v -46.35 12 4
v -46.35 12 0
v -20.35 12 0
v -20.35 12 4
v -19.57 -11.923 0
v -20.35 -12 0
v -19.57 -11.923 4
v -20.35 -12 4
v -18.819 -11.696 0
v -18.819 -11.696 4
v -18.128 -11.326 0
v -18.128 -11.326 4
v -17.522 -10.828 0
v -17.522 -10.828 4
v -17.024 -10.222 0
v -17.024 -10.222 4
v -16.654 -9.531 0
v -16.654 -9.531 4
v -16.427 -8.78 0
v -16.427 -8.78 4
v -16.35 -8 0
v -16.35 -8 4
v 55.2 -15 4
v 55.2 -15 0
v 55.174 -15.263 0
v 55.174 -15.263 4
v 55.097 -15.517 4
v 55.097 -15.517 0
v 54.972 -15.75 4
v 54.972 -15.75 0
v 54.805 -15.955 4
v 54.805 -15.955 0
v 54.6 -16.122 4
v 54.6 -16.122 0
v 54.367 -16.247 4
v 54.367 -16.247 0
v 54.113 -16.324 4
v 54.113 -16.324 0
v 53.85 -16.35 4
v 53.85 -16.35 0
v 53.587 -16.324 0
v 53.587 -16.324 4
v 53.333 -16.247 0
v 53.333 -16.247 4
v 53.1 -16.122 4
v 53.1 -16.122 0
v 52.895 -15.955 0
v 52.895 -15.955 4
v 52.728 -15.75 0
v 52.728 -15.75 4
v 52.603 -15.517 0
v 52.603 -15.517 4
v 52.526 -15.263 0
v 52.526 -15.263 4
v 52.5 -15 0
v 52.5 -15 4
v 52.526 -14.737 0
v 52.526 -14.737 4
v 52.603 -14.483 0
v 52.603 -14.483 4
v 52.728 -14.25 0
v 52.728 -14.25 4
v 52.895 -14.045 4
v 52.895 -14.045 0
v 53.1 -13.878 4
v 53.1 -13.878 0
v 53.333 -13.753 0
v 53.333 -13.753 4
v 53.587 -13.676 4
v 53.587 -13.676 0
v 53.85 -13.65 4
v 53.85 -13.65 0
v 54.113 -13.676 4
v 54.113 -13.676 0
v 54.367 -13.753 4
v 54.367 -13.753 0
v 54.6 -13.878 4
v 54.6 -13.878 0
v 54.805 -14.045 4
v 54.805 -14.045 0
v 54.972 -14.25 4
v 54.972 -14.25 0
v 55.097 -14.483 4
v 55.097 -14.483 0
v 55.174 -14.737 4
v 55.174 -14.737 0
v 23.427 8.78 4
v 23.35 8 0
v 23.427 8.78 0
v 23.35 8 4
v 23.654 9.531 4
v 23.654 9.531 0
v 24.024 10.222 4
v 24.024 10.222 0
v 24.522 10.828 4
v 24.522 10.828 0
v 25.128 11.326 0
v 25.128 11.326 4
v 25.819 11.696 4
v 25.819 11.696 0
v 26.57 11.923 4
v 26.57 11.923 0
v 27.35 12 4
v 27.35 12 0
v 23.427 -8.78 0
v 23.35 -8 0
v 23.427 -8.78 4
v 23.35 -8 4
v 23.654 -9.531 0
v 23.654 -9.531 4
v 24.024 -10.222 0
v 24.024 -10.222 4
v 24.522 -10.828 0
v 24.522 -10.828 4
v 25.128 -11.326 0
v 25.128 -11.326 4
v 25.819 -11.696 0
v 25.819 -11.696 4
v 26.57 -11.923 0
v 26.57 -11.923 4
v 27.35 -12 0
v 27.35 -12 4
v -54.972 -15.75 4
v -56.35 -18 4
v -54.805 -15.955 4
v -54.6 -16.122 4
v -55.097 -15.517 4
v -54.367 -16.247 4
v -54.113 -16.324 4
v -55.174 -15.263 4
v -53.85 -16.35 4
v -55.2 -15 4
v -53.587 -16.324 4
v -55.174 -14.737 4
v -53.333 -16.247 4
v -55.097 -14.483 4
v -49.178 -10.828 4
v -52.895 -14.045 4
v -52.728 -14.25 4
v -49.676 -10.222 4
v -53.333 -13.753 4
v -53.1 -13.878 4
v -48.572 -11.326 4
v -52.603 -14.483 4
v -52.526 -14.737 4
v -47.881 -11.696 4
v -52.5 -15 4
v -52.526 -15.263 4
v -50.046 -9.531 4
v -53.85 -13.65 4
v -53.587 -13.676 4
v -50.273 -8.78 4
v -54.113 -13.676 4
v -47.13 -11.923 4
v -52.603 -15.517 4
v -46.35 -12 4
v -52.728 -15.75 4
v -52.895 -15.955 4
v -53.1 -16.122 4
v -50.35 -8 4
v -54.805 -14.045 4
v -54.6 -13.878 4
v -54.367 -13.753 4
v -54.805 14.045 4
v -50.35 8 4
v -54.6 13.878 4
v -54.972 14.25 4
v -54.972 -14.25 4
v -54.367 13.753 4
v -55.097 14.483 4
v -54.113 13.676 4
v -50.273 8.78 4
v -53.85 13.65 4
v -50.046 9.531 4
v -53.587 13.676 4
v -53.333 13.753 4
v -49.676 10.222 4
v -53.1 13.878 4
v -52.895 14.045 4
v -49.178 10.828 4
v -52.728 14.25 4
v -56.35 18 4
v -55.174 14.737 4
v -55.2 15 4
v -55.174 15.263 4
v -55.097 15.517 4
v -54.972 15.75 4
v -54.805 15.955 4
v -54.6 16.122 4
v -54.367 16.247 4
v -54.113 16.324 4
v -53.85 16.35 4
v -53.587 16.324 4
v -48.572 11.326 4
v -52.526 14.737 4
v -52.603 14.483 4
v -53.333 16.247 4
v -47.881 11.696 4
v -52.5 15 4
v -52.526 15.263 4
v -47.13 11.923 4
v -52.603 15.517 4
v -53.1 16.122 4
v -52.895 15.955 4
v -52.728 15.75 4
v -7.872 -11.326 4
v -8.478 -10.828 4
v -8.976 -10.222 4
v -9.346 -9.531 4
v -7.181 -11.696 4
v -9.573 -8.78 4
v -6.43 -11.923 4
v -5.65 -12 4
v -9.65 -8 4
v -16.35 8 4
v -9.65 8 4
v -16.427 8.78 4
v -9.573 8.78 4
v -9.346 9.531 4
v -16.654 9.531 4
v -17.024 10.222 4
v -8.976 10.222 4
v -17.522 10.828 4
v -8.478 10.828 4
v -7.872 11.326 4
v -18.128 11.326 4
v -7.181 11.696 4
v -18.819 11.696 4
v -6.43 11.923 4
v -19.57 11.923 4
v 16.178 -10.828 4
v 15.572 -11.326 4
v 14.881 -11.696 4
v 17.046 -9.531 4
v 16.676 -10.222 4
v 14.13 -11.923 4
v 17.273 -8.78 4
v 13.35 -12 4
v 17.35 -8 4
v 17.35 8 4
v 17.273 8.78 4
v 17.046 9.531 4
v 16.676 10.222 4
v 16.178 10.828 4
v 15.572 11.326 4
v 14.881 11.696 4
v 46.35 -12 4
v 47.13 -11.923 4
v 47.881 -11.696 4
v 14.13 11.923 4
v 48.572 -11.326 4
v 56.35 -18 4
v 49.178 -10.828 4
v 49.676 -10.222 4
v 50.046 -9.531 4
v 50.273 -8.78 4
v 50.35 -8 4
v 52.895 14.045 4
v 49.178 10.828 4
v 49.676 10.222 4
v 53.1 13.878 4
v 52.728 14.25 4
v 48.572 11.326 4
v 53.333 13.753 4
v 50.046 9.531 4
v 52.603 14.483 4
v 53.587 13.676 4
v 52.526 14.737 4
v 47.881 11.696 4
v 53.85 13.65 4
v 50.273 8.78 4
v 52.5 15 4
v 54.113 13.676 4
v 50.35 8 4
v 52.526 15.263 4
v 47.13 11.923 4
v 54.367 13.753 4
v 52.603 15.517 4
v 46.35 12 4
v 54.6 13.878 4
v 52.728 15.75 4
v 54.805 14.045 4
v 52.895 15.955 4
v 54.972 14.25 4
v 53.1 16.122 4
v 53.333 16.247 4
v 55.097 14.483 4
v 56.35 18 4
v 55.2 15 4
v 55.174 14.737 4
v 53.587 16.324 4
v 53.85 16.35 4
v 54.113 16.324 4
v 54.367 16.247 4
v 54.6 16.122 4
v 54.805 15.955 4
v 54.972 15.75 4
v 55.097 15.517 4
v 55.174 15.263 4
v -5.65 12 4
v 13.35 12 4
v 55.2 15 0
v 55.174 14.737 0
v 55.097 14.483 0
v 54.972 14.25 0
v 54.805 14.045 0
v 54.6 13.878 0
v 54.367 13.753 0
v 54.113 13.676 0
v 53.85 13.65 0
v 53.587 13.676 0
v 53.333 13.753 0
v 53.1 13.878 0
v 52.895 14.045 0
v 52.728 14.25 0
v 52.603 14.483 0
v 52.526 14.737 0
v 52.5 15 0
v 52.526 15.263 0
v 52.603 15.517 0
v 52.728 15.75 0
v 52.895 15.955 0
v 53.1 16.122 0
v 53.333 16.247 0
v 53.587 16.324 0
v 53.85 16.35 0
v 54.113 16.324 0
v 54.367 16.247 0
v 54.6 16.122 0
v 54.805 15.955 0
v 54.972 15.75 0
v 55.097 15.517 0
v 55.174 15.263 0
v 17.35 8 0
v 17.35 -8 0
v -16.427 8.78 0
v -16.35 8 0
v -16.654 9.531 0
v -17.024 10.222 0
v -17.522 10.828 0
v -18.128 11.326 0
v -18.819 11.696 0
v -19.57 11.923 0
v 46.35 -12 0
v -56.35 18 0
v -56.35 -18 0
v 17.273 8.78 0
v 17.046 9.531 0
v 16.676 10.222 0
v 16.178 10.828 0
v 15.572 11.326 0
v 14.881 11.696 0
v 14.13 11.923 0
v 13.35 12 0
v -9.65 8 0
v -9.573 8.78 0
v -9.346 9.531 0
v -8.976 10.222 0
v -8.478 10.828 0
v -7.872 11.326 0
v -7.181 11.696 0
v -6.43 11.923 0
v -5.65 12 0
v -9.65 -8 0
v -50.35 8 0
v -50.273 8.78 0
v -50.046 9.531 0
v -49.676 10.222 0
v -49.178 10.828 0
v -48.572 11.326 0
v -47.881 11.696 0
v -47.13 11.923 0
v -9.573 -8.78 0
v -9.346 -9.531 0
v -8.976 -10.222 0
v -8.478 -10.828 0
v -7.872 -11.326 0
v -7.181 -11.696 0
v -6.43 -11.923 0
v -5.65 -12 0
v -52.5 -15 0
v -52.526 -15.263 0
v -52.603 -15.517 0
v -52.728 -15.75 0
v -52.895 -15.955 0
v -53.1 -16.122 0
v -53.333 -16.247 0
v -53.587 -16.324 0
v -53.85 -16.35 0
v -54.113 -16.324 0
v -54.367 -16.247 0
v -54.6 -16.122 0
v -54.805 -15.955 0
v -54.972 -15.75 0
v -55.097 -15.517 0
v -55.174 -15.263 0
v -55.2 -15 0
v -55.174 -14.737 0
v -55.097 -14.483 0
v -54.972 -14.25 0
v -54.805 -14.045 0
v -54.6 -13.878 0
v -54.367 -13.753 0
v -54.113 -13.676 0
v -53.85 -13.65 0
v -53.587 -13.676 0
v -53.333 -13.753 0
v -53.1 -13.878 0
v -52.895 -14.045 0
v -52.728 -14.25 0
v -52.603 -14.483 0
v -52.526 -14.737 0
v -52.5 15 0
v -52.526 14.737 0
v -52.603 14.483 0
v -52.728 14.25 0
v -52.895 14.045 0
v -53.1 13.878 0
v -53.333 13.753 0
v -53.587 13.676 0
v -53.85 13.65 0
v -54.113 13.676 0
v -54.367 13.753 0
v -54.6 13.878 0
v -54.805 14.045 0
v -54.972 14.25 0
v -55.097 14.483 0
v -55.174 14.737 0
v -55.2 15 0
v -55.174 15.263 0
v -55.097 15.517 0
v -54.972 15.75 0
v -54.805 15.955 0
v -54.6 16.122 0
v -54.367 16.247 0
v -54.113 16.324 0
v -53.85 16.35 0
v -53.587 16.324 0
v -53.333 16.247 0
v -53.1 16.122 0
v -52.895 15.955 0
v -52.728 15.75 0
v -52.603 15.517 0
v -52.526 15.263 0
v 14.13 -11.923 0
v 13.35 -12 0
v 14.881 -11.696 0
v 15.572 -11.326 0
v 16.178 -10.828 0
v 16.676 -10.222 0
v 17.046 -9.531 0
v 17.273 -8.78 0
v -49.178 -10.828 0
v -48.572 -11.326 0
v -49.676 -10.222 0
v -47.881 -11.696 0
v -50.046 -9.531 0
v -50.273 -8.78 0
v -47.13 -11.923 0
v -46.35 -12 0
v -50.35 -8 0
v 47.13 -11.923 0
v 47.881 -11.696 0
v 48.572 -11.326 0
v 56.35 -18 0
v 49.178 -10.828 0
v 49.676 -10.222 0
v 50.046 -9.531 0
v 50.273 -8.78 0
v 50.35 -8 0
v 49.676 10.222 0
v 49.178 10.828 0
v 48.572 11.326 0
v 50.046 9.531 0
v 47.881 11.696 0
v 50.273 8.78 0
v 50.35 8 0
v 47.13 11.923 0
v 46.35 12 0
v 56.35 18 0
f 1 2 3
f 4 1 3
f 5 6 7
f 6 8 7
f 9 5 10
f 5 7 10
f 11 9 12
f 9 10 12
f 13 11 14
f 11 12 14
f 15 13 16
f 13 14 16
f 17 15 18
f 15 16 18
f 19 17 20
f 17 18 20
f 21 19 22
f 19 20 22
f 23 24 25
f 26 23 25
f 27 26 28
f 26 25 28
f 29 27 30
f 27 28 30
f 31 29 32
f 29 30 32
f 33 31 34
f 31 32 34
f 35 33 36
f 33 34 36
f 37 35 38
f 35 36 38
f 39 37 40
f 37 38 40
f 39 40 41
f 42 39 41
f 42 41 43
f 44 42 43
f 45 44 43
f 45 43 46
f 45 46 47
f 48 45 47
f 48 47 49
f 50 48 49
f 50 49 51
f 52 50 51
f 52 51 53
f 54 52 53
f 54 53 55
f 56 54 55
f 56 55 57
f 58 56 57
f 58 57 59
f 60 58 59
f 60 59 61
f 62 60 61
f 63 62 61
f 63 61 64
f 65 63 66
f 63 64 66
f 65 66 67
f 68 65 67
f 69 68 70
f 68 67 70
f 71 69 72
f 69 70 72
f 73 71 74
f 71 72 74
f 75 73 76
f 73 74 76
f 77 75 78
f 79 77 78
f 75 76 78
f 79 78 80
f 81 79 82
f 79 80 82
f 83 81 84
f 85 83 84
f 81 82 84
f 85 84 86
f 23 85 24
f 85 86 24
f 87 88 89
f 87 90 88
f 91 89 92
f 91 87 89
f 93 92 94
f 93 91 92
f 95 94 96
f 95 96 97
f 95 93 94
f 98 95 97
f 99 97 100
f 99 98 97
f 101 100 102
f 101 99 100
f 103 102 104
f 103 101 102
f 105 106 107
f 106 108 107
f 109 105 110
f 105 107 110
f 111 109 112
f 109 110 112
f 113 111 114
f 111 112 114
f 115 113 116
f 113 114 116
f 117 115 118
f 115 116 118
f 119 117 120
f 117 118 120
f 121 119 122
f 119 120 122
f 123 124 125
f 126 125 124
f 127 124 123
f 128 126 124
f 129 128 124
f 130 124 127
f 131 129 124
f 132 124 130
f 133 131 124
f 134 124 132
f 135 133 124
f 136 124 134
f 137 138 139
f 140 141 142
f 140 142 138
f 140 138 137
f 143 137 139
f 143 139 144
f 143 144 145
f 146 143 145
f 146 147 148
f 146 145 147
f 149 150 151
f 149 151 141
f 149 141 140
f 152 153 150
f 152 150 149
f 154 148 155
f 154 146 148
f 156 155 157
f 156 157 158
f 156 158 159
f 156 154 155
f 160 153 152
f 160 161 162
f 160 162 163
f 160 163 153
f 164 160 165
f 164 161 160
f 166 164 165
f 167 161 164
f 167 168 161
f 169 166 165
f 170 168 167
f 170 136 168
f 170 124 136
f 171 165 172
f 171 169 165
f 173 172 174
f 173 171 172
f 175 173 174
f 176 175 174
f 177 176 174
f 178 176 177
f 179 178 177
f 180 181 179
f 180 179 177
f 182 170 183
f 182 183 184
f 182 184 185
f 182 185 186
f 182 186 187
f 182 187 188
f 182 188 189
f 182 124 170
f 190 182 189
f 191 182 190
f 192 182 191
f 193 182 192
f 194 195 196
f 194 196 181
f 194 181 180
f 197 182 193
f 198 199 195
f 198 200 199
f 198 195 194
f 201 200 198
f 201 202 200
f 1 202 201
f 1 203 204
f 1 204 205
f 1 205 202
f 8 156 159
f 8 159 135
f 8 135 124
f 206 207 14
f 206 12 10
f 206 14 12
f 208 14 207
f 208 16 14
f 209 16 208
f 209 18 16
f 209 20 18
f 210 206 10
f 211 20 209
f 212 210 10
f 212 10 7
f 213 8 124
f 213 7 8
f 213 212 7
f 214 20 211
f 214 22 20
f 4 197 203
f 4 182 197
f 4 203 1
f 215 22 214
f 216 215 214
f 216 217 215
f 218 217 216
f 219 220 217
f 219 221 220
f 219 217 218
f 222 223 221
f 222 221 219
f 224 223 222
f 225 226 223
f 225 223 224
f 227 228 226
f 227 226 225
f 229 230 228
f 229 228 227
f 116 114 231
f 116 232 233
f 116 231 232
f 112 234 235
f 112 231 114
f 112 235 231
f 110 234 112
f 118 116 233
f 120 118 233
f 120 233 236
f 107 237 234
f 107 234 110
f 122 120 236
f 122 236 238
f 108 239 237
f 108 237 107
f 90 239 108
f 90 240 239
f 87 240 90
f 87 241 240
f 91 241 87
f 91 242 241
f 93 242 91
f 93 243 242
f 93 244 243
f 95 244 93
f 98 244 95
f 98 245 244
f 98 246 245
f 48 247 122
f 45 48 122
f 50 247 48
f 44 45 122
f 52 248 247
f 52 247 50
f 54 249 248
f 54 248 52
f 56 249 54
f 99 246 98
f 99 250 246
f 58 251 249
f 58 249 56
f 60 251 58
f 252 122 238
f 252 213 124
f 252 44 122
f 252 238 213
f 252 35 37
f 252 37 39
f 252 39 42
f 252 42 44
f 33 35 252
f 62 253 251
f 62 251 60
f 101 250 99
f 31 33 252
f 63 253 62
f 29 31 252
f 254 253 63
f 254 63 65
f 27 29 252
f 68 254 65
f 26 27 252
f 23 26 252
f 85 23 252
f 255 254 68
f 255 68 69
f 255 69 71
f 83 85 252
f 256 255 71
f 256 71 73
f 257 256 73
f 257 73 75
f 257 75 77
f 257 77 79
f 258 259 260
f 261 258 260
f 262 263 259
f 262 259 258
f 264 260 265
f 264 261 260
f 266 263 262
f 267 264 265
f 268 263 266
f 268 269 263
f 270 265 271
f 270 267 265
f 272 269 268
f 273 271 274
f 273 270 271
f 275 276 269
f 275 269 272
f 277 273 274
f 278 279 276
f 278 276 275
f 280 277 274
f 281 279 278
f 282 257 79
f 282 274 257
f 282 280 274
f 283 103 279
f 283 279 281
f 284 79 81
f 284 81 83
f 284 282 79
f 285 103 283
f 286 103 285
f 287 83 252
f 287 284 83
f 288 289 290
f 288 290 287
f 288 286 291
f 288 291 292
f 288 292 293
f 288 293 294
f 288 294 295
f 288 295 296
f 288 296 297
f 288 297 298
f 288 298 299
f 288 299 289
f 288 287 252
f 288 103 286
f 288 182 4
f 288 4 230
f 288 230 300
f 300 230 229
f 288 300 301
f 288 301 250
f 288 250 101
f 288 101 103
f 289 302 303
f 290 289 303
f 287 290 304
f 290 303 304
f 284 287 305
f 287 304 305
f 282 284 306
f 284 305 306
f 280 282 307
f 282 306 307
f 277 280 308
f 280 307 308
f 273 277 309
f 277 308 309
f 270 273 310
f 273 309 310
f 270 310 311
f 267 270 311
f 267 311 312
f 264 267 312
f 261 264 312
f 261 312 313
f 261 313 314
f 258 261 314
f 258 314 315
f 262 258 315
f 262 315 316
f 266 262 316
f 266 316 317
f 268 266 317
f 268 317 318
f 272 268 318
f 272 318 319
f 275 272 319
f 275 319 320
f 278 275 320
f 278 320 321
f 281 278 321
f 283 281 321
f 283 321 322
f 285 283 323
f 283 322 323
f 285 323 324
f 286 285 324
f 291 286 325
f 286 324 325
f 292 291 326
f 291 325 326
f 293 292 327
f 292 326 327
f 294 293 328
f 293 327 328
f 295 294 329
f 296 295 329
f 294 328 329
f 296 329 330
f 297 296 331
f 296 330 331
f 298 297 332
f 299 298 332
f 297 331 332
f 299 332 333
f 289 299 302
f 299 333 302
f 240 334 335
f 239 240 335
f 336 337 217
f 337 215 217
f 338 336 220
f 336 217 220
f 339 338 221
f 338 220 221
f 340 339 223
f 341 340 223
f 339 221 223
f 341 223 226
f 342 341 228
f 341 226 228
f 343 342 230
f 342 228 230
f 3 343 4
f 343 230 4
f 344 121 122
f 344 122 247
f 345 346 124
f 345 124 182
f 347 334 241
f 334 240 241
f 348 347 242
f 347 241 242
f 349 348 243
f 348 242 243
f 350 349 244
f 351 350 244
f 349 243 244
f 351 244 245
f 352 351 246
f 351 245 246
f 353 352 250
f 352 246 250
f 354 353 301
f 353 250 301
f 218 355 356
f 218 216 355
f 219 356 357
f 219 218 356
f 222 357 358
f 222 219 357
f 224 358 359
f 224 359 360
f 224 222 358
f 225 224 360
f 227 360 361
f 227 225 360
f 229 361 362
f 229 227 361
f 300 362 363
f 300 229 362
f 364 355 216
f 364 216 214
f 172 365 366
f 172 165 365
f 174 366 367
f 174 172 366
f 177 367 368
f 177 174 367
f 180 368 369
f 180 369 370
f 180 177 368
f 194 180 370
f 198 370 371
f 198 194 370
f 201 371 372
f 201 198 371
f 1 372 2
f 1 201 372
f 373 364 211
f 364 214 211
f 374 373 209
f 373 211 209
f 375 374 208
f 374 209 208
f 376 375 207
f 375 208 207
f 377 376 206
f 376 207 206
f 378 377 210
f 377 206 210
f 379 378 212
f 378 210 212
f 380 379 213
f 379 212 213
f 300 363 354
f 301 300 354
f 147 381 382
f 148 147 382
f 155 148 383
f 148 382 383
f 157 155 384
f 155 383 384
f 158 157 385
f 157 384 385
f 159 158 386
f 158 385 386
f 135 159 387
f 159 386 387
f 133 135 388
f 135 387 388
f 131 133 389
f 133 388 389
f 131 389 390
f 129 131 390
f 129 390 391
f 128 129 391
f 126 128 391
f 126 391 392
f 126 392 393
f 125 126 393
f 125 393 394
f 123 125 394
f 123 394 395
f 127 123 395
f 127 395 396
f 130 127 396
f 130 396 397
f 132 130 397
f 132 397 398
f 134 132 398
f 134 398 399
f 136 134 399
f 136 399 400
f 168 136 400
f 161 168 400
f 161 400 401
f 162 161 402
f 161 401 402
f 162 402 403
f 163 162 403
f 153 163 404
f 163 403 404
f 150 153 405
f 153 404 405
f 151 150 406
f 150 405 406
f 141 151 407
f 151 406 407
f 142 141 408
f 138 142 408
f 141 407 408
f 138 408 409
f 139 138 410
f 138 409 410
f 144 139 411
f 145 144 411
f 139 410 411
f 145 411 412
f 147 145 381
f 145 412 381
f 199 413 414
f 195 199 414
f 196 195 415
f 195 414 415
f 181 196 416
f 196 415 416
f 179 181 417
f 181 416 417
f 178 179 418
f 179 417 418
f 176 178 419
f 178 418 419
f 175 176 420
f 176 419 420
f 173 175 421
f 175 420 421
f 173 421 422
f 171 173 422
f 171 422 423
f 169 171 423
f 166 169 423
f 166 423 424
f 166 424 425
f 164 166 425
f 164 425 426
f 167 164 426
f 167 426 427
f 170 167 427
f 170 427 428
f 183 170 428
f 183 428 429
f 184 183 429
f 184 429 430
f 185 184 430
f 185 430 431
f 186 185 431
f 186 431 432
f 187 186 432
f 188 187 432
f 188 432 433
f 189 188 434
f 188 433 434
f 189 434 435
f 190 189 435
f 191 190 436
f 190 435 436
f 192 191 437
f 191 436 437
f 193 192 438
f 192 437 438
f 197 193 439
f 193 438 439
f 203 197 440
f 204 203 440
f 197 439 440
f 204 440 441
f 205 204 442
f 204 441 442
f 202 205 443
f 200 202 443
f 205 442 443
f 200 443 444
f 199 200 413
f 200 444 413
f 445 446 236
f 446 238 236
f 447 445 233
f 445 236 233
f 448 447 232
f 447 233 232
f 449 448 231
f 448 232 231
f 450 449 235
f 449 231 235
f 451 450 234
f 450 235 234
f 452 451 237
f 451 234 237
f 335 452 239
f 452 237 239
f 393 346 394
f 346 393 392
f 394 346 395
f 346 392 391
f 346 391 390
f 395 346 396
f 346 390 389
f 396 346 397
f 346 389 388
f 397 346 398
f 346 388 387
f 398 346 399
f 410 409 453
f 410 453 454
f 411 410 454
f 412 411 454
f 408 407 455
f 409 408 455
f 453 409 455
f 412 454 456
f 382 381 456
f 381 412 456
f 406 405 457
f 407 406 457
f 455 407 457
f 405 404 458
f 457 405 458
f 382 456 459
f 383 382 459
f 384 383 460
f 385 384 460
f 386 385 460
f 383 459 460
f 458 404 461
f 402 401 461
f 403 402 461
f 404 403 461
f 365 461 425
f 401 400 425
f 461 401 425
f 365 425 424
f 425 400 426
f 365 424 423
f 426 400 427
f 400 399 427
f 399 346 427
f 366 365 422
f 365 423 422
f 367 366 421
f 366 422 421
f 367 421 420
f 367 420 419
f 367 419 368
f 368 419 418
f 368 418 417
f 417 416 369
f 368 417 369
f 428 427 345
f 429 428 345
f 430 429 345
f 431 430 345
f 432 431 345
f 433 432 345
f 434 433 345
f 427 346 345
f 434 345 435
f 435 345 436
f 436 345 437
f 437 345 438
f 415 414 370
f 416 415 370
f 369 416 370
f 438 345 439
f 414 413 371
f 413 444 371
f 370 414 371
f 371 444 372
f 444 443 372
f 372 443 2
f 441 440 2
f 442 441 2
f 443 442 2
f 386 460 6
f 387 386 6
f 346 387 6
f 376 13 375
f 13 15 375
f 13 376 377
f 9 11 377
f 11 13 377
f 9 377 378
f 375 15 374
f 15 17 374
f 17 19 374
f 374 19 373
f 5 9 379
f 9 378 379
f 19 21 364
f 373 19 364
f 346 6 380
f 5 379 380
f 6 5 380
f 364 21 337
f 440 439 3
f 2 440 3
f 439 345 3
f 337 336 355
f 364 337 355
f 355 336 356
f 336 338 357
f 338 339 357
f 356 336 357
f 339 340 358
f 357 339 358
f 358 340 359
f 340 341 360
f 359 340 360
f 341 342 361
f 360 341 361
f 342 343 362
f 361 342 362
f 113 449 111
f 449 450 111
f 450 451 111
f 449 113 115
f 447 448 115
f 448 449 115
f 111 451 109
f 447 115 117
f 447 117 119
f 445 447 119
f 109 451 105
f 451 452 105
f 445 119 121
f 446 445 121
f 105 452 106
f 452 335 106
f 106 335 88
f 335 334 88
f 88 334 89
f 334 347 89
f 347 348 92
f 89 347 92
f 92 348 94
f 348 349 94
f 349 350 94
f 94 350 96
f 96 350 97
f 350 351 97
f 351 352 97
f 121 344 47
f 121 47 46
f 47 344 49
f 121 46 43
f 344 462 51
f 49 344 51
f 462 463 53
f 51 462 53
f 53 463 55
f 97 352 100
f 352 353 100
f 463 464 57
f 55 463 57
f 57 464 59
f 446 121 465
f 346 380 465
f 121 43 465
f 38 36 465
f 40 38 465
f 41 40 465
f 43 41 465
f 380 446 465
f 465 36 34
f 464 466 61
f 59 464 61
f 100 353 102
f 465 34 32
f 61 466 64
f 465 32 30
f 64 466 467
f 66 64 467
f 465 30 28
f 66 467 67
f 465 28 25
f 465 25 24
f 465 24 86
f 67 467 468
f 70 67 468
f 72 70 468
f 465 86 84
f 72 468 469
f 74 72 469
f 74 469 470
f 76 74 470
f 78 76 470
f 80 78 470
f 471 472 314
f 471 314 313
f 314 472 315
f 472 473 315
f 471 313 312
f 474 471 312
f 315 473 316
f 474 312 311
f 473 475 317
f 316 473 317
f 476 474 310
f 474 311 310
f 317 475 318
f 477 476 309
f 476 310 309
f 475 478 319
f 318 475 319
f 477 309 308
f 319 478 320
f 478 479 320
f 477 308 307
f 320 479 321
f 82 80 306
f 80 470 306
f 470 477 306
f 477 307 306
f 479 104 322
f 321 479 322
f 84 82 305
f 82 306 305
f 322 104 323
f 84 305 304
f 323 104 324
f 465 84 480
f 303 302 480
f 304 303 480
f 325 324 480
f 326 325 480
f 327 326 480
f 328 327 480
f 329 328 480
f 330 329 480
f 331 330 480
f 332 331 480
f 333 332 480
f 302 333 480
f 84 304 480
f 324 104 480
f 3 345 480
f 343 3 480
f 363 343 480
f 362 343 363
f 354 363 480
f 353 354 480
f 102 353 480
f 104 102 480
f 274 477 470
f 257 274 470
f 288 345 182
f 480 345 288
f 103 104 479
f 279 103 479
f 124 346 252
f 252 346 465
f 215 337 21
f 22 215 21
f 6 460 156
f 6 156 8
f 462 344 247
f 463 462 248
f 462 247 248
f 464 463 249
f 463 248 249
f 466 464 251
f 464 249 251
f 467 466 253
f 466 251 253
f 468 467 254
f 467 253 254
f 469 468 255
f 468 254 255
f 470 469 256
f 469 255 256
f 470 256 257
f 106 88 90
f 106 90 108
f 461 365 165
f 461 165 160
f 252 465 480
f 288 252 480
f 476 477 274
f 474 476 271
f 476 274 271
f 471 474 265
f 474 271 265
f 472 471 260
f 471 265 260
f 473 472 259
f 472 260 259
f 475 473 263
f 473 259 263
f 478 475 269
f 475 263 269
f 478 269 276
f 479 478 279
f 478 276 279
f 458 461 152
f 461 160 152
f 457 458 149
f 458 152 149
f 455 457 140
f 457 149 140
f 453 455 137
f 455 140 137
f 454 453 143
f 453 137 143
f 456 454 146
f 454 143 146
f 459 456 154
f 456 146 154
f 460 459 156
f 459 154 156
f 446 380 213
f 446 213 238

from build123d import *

# Parameters (mm, degrees)
F0_W     = 112.7
F0_H     = 36
F1_DEPTH = 4
F2_R     = 1.35
F3_DEPTH = 4.001
F4_W     = 34
F4_H     = 24
F4_W_2   = 27
F5_DEPTH = 4.001
F6_R     = 4


# Not quite as in the source:
# - a feature names something its author has since deleted; it is built from what else it names


with BuildPart() as f1:
    # F0 (on Top) → F1 (new body)
    with BuildSketch(Plane.XY):
        Rectangle(F0_W, F0_H)
    extrude(amount=F1_DEPTH)

    # F2 (on face) → F3 (cut, through all)
    with BuildSketch(Plane(origin=(0, 0, 0), x_dir=(1, 0, 0), z_dir=(0, 0, -1))):
        with Locations((-53.85, 15)):
            Circle(F2_R)
        with Locations((-53.85, -15)):
            Circle(F2_R)
        with Locations((53.85, 15)):
            Circle(F2_R)
        with Locations((53.85, -15)):
            Circle(F2_R)
    extrude(amount=-F3_DEPTH, mode=Mode.SUBTRACT)

    # F4 (on face) → F5 (cut, through all)
    with BuildSketch(Plane(origin=(0, 0, 0), x_dir=(1, 0, 0), z_dir=(0, 0, -1))):
        with Locations((-33.35, 0)):
            Rectangle(F4_W, F4_H)
        with Locations((3.85, 0)):
            Rectangle(F4_W_2, F4_H)
        with Locations((36.85, 0)):
            Rectangle(F4_W_2, F4_H)
    extrude(amount=-F5_DEPTH, mode=Mode.SUBTRACT)

    # F6
    f6_edges = [f1.edges().sort_by_distance(p)[0] for p in [
        (-16.35, -12, 2),
        (-50.35, -12, 2),
        (-50.35, 12, 2),
        (-16.35, 12, 2),
        (-9.65, -12, 2),
        (23.35, -12, 2),
        (-9.65, 12, 2),
        (17.35, -12, 2),
        (50.35, -12, 2),
        (50.35, 12, 2),
        (23.35, 12, 2),
        (17.35, 12, 2),
    ]]
    fillet(f6_edges, radius=F6_R)


solid = f1.part
